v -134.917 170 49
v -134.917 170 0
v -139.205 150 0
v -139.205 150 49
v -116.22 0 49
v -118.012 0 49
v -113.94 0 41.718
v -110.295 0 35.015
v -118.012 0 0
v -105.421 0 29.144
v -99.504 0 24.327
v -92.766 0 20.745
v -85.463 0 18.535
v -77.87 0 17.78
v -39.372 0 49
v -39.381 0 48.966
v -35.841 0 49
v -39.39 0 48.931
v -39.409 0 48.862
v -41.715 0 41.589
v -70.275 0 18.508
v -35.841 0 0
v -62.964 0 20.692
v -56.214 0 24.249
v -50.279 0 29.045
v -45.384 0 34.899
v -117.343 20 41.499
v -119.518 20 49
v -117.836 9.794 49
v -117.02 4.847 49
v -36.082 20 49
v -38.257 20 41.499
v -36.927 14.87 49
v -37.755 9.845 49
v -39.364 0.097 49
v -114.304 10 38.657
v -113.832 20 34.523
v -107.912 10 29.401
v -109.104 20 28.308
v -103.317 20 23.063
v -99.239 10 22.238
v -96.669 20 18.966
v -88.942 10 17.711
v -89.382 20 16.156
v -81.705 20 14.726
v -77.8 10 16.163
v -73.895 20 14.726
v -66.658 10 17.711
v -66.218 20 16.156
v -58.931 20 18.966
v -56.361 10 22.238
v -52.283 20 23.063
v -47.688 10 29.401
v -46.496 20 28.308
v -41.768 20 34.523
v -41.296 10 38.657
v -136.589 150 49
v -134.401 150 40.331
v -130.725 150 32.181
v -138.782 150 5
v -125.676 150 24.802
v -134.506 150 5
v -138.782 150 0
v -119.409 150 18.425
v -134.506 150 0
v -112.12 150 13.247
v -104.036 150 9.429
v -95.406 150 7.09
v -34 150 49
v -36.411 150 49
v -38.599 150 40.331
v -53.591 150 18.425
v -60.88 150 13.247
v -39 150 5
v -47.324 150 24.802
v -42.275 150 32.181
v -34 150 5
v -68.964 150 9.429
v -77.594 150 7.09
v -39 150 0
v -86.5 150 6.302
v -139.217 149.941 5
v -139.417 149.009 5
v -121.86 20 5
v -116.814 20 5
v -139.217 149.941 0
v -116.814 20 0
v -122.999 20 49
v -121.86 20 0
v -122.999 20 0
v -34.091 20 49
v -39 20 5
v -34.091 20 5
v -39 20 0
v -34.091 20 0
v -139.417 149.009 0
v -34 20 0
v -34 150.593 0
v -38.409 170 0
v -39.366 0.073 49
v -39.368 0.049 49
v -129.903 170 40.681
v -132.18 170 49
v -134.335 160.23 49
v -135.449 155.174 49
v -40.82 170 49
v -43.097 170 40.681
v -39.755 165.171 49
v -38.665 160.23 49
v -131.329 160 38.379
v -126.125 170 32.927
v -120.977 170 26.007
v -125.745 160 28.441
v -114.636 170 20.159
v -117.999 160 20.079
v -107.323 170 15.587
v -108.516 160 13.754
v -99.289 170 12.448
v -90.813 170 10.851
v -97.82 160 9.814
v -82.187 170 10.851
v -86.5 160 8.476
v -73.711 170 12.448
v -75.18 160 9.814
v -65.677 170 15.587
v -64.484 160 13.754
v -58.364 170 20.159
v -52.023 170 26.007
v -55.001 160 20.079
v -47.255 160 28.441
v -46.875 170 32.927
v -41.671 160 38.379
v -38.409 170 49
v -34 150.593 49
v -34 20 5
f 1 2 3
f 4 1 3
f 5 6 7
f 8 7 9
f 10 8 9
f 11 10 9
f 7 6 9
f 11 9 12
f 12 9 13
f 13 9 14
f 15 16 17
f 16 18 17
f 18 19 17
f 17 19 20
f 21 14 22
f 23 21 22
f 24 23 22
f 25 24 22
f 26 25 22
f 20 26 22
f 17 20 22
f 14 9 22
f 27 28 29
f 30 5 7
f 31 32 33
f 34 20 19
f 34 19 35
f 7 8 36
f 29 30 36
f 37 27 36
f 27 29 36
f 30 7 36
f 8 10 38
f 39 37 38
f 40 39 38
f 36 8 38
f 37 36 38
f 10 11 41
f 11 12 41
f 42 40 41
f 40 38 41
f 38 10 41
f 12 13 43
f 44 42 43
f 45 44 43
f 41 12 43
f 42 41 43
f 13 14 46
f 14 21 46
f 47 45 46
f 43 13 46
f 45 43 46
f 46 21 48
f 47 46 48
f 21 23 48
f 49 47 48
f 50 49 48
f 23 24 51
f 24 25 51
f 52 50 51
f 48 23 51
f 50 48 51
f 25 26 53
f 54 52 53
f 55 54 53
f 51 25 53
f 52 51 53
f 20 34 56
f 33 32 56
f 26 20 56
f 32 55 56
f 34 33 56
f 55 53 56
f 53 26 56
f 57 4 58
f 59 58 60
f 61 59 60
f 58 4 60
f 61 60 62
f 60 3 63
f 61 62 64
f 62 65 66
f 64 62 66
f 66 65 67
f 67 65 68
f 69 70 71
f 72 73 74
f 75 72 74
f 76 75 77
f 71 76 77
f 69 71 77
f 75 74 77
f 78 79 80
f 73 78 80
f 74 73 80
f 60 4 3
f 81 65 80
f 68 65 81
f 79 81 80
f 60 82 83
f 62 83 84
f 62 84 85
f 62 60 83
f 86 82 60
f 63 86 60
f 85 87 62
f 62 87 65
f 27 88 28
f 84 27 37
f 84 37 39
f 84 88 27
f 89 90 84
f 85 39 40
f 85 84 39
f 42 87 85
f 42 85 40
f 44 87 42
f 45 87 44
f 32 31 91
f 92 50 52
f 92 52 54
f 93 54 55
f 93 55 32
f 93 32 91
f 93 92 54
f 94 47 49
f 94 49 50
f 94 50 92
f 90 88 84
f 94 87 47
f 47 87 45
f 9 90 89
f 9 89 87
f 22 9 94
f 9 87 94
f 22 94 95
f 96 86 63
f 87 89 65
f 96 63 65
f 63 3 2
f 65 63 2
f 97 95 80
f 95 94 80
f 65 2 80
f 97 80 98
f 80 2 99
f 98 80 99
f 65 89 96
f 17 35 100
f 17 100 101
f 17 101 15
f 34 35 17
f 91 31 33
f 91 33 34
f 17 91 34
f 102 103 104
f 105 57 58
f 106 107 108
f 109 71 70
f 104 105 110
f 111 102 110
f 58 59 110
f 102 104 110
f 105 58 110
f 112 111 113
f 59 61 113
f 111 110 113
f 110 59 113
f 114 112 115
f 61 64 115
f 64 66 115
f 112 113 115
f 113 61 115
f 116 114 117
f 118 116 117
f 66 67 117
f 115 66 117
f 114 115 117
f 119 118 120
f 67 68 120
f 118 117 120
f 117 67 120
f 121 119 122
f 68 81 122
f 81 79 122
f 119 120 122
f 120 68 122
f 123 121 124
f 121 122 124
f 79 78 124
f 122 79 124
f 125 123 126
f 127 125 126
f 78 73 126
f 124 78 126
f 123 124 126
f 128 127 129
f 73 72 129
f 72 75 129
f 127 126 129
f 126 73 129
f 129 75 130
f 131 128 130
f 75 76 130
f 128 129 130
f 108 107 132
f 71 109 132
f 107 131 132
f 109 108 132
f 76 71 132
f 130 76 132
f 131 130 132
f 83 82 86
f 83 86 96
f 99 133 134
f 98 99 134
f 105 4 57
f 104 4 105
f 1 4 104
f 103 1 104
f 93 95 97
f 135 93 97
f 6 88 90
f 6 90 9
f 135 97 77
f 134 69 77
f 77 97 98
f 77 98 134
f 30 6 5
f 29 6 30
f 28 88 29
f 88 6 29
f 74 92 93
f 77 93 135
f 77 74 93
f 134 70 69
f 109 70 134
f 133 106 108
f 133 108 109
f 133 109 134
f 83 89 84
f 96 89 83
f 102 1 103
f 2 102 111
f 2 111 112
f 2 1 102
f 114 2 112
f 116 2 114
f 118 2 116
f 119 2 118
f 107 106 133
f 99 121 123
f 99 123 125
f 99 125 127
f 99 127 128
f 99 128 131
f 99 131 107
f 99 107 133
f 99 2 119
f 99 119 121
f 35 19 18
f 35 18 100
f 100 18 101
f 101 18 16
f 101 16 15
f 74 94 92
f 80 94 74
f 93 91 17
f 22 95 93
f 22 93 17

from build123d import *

# Parameters (mm, degrees)
BOX004_W                = 40
BOX004_H                = 20
BOX004_DEPTH            = 49
BOX004_PLACEMENT_ANGLE  = 257.9
BOX003_W                = 40
BOX003_H                = 20
BOX003_DEPTH            = 49
BOX003_PLACEMENT_ANGLE  = 282.8
BOX001_W                = 105.5
BOX001_H                = 20
BOX001_DEPTH            = 49
BOX007_W                = 5
BOX007_H                = 135
BOX007_DEPTH            = 5
BOX007_PLACEMENT_ANGLE  = 352.25
BOX008_W                = 5
BOX008_H                = 130
BOX008_DEPTH            = 5
CONE001_ROLL_ANGLE      = 89.4112
CONE001_PITCH_ANGLE     = 3.998897
CONE001_PLACEMENT_ANGLE = 0.893236
BOX002_W                = 40
BOX002_H                = 20
BOX002_DEPTH            = 49
BOX002_PLACEMENT_ANGLE  = 76
BOX005_W                = 40
BOX005_H                = 20
BOX005_DEPTH            = 49
BOX005_PLACEMENT_ANGLE  = 95
BOX_W                   = 89
BOX_H                   = 20
BOX_DEPTH               = 49


with BuildPart() as cube004:
    # Box004 → Box004 (new body)
    with BuildSketch(Plane.XY):
        with Locations((20, 10)):
            Rectangle(BOX004_W, BOX004_H)
    extrude(amount=BOX004_DEPTH)


with BuildPart() as cube004_1:
    # Box004 placement: moved
    add(cube004.part.moved(Location((-152.64395, 182.723164, 0))).rotate(Axis((-152.64395, 182.723164, 0), (0, 0, 1)), BOX004_PLACEMENT_ANGLE))


with BuildPart() as cone:
    # Cone → Cone (revolve)
    with BuildSketch(Plane(origin=(-86.5, 170, 57.03), x_dir=(1, 0, 0), z_dir=(0, 0, -1))):
        Polygon((0, 0), (46.38, 0), (50.75, 20.1), (0, 20.1), align=None)
    revolve(axis=Axis((-86.5, 170, 57.03), (0, -1, 0)))


with BuildPart() as cube003:
    # Box003 → Box003 (new body)
    with BuildSketch(Plane.XY):
        with Locations((20, 10)):
            Rectangle(BOX003_W, BOX003_H)
    extrude(amount=BOX003_DEPTH)


with BuildPart() as cube003_1:
    # Box003 placement: moved
    add(cube003.part.moved(Location((-38.594683, 170.816256, 0))).rotate(Axis((-38.594683, 170.816256, 0), (0, 0, 1)), BOX003_PLACEMENT_ANGLE))


with BuildPart() as cut003:
    # Box001 → Box001 (new body)
    with BuildSketch(Plane(origin=(-139.5, 150, 0), x_dir=(1, 0, 0), z_dir=(0, 0, 1))):
        with Locations((52.75, 10)):
            Rectangle(BOX001_W, BOX001_H)
    extrude(amount=BOX001_DEPTH)

    # Cut003: cut Cube003
    add(cube003_1.part, mode=Mode.SUBTRACT)


with BuildPart() as cut005:
    # Box007 → Box007 (new body)
    with BuildSketch(Plane.XY):
        with Locations((2.5, 67.5)):
            Rectangle(BOX007_W, BOX007_H)
    extrude(amount=BOX007_DEPTH)


with BuildPart() as cut005_1:
    # Box007 placement: moved
    add(cut005.part.moved(Location((-121.333055, 16.130182, 0))).rotate(Axis((-121.333055, 16.130182, 0), (0, 0, -1)), BOX007_PLACEMENT_ANGLE))

    # Fusion: union Cut003
    add(cut003.part)

    # Cut004: cut Cone
    add(cone.part, mode=Mode.SUBTRACT)

    # Cut005: cut Cube004
    add(cube004_1.part, mode=Mode.SUBTRACT)


with BuildPart() as cube008:
    # Box008 → Box008 (new body)
    with BuildSketch(Plane(origin=(-39, 20, 0), x_dir=(1, 0, 0), z_dir=(0, 0, 1))):
        with Locations((2.5, 65)):
            Rectangle(BOX008_W, BOX008_H)
    extrude(amount=BOX008_DEPTH)


with BuildPart() as cone002:
    # Cone002 → Cone002 (revolve)
    with BuildSketch(Plane(origin=(-77.8, 20.1, 57.03), x_dir=(1, 0, 0), z_dir=(0, 0, -1))):
        Polygon((0, 0), (42.5, 0), (39.25, 20.1), (0, 20.1), align=None)
    revolve(axis=Axis((-77.8, 20.1, 57.03), (0, -1, 0)))


with BuildPart() as cone001:
    # Cone001 → Cone001 (revolve)
    with BuildSketch(Plane.XZ):
        Polygon((0, 0), (41.5, 0), (39.25, 25), (0, 25), align=None)
    revolve(axis=Axis((0, 0, 0), (0, 0, 1)))


with BuildPart() as cone001_1:
    # Cone001 roll: moved
    add(cone001.part.rotate(Axis((0, 0, 0), (1, 0, 0)), CONE001_ROLL_ANGLE))


with BuildPart() as cone001_2:
    # Cone001 pitch: moved
    add(cone001_1.part.rotate(Axis((0, 0, 0), (0, 1, 0)), CONE001_PITCH_ANGLE))


with BuildPart() as cone001_3:
    # Cone001 placement: moved
    add(cone001_2.part.moved(Location((-77.76807, 22.976255, 59.052418))).rotate(Axis((-77.76807, 22.976255, 59.052418), (0, 0, 1)), CONE001_PLACEMENT_ANGLE))


with BuildPart() as cube002:
    # Box002 → Box002 (new body)
    with BuildSketch(Plane.XY):
        with Locations((20, 10)):
            Rectangle(BOX002_W, BOX002_H)
    extrude(amount=BOX002_DEPTH)


with BuildPart() as cube002_1:
    # Box002 placement: moved
    add(cube002.part.moved(Location((-143.09, 17.91, 0))).rotate(Axis((-143.09, 17.91, 0), (0, 0, -1)), BOX002_PLACEMENT_ANGLE))


with BuildPart() as cube005:
    # Box005 → Box005 (new body)
    with BuildSketch(Plane.XY):
        with Locations((20, 10)):
            Rectangle(BOX005_W, BOX005_H)
    extrude(amount=BOX005_DEPTH)


with BuildPart() as cube005_1:
    # Box005 placement: moved
    add(cube005.part.moved(Location((-33.959196, 21.508677, 0))).rotate(Axis((-33.959196, 21.508677, 0), (0, 0, -1)), BOX005_PLACEMENT_ANGLE))


with BuildPart() as fusion001:
    # Box → Box (new body)
    with BuildSketch(Plane(origin=(-123, 0, 0), x_dir=(1, 0, 0), z_dir=(0, 0, 1))):
        with Locations((44.5, 10)):
            Rectangle(BOX_W, BOX_H)
    extrude(amount=BOX_DEPTH)

    # Cut: cut Cube005
    add(cube005_1.part, mode=Mode.SUBTRACT)

    # Cut001: cut Cube002
    add(cube002_1.part, mode=Mode.SUBTRACT)

    # Cut002: cut Cone001
    add(cone001_3.part, mode=Mode.SUBTRACT)

    # Cut006: cut Cone002
    add(cone002.part, mode=Mode.SUBTRACT)

    # Fusion001: union Cut005, Cube008
    add(cut005_1.part)
    add(cube008.part)


solid = fusion001.part
